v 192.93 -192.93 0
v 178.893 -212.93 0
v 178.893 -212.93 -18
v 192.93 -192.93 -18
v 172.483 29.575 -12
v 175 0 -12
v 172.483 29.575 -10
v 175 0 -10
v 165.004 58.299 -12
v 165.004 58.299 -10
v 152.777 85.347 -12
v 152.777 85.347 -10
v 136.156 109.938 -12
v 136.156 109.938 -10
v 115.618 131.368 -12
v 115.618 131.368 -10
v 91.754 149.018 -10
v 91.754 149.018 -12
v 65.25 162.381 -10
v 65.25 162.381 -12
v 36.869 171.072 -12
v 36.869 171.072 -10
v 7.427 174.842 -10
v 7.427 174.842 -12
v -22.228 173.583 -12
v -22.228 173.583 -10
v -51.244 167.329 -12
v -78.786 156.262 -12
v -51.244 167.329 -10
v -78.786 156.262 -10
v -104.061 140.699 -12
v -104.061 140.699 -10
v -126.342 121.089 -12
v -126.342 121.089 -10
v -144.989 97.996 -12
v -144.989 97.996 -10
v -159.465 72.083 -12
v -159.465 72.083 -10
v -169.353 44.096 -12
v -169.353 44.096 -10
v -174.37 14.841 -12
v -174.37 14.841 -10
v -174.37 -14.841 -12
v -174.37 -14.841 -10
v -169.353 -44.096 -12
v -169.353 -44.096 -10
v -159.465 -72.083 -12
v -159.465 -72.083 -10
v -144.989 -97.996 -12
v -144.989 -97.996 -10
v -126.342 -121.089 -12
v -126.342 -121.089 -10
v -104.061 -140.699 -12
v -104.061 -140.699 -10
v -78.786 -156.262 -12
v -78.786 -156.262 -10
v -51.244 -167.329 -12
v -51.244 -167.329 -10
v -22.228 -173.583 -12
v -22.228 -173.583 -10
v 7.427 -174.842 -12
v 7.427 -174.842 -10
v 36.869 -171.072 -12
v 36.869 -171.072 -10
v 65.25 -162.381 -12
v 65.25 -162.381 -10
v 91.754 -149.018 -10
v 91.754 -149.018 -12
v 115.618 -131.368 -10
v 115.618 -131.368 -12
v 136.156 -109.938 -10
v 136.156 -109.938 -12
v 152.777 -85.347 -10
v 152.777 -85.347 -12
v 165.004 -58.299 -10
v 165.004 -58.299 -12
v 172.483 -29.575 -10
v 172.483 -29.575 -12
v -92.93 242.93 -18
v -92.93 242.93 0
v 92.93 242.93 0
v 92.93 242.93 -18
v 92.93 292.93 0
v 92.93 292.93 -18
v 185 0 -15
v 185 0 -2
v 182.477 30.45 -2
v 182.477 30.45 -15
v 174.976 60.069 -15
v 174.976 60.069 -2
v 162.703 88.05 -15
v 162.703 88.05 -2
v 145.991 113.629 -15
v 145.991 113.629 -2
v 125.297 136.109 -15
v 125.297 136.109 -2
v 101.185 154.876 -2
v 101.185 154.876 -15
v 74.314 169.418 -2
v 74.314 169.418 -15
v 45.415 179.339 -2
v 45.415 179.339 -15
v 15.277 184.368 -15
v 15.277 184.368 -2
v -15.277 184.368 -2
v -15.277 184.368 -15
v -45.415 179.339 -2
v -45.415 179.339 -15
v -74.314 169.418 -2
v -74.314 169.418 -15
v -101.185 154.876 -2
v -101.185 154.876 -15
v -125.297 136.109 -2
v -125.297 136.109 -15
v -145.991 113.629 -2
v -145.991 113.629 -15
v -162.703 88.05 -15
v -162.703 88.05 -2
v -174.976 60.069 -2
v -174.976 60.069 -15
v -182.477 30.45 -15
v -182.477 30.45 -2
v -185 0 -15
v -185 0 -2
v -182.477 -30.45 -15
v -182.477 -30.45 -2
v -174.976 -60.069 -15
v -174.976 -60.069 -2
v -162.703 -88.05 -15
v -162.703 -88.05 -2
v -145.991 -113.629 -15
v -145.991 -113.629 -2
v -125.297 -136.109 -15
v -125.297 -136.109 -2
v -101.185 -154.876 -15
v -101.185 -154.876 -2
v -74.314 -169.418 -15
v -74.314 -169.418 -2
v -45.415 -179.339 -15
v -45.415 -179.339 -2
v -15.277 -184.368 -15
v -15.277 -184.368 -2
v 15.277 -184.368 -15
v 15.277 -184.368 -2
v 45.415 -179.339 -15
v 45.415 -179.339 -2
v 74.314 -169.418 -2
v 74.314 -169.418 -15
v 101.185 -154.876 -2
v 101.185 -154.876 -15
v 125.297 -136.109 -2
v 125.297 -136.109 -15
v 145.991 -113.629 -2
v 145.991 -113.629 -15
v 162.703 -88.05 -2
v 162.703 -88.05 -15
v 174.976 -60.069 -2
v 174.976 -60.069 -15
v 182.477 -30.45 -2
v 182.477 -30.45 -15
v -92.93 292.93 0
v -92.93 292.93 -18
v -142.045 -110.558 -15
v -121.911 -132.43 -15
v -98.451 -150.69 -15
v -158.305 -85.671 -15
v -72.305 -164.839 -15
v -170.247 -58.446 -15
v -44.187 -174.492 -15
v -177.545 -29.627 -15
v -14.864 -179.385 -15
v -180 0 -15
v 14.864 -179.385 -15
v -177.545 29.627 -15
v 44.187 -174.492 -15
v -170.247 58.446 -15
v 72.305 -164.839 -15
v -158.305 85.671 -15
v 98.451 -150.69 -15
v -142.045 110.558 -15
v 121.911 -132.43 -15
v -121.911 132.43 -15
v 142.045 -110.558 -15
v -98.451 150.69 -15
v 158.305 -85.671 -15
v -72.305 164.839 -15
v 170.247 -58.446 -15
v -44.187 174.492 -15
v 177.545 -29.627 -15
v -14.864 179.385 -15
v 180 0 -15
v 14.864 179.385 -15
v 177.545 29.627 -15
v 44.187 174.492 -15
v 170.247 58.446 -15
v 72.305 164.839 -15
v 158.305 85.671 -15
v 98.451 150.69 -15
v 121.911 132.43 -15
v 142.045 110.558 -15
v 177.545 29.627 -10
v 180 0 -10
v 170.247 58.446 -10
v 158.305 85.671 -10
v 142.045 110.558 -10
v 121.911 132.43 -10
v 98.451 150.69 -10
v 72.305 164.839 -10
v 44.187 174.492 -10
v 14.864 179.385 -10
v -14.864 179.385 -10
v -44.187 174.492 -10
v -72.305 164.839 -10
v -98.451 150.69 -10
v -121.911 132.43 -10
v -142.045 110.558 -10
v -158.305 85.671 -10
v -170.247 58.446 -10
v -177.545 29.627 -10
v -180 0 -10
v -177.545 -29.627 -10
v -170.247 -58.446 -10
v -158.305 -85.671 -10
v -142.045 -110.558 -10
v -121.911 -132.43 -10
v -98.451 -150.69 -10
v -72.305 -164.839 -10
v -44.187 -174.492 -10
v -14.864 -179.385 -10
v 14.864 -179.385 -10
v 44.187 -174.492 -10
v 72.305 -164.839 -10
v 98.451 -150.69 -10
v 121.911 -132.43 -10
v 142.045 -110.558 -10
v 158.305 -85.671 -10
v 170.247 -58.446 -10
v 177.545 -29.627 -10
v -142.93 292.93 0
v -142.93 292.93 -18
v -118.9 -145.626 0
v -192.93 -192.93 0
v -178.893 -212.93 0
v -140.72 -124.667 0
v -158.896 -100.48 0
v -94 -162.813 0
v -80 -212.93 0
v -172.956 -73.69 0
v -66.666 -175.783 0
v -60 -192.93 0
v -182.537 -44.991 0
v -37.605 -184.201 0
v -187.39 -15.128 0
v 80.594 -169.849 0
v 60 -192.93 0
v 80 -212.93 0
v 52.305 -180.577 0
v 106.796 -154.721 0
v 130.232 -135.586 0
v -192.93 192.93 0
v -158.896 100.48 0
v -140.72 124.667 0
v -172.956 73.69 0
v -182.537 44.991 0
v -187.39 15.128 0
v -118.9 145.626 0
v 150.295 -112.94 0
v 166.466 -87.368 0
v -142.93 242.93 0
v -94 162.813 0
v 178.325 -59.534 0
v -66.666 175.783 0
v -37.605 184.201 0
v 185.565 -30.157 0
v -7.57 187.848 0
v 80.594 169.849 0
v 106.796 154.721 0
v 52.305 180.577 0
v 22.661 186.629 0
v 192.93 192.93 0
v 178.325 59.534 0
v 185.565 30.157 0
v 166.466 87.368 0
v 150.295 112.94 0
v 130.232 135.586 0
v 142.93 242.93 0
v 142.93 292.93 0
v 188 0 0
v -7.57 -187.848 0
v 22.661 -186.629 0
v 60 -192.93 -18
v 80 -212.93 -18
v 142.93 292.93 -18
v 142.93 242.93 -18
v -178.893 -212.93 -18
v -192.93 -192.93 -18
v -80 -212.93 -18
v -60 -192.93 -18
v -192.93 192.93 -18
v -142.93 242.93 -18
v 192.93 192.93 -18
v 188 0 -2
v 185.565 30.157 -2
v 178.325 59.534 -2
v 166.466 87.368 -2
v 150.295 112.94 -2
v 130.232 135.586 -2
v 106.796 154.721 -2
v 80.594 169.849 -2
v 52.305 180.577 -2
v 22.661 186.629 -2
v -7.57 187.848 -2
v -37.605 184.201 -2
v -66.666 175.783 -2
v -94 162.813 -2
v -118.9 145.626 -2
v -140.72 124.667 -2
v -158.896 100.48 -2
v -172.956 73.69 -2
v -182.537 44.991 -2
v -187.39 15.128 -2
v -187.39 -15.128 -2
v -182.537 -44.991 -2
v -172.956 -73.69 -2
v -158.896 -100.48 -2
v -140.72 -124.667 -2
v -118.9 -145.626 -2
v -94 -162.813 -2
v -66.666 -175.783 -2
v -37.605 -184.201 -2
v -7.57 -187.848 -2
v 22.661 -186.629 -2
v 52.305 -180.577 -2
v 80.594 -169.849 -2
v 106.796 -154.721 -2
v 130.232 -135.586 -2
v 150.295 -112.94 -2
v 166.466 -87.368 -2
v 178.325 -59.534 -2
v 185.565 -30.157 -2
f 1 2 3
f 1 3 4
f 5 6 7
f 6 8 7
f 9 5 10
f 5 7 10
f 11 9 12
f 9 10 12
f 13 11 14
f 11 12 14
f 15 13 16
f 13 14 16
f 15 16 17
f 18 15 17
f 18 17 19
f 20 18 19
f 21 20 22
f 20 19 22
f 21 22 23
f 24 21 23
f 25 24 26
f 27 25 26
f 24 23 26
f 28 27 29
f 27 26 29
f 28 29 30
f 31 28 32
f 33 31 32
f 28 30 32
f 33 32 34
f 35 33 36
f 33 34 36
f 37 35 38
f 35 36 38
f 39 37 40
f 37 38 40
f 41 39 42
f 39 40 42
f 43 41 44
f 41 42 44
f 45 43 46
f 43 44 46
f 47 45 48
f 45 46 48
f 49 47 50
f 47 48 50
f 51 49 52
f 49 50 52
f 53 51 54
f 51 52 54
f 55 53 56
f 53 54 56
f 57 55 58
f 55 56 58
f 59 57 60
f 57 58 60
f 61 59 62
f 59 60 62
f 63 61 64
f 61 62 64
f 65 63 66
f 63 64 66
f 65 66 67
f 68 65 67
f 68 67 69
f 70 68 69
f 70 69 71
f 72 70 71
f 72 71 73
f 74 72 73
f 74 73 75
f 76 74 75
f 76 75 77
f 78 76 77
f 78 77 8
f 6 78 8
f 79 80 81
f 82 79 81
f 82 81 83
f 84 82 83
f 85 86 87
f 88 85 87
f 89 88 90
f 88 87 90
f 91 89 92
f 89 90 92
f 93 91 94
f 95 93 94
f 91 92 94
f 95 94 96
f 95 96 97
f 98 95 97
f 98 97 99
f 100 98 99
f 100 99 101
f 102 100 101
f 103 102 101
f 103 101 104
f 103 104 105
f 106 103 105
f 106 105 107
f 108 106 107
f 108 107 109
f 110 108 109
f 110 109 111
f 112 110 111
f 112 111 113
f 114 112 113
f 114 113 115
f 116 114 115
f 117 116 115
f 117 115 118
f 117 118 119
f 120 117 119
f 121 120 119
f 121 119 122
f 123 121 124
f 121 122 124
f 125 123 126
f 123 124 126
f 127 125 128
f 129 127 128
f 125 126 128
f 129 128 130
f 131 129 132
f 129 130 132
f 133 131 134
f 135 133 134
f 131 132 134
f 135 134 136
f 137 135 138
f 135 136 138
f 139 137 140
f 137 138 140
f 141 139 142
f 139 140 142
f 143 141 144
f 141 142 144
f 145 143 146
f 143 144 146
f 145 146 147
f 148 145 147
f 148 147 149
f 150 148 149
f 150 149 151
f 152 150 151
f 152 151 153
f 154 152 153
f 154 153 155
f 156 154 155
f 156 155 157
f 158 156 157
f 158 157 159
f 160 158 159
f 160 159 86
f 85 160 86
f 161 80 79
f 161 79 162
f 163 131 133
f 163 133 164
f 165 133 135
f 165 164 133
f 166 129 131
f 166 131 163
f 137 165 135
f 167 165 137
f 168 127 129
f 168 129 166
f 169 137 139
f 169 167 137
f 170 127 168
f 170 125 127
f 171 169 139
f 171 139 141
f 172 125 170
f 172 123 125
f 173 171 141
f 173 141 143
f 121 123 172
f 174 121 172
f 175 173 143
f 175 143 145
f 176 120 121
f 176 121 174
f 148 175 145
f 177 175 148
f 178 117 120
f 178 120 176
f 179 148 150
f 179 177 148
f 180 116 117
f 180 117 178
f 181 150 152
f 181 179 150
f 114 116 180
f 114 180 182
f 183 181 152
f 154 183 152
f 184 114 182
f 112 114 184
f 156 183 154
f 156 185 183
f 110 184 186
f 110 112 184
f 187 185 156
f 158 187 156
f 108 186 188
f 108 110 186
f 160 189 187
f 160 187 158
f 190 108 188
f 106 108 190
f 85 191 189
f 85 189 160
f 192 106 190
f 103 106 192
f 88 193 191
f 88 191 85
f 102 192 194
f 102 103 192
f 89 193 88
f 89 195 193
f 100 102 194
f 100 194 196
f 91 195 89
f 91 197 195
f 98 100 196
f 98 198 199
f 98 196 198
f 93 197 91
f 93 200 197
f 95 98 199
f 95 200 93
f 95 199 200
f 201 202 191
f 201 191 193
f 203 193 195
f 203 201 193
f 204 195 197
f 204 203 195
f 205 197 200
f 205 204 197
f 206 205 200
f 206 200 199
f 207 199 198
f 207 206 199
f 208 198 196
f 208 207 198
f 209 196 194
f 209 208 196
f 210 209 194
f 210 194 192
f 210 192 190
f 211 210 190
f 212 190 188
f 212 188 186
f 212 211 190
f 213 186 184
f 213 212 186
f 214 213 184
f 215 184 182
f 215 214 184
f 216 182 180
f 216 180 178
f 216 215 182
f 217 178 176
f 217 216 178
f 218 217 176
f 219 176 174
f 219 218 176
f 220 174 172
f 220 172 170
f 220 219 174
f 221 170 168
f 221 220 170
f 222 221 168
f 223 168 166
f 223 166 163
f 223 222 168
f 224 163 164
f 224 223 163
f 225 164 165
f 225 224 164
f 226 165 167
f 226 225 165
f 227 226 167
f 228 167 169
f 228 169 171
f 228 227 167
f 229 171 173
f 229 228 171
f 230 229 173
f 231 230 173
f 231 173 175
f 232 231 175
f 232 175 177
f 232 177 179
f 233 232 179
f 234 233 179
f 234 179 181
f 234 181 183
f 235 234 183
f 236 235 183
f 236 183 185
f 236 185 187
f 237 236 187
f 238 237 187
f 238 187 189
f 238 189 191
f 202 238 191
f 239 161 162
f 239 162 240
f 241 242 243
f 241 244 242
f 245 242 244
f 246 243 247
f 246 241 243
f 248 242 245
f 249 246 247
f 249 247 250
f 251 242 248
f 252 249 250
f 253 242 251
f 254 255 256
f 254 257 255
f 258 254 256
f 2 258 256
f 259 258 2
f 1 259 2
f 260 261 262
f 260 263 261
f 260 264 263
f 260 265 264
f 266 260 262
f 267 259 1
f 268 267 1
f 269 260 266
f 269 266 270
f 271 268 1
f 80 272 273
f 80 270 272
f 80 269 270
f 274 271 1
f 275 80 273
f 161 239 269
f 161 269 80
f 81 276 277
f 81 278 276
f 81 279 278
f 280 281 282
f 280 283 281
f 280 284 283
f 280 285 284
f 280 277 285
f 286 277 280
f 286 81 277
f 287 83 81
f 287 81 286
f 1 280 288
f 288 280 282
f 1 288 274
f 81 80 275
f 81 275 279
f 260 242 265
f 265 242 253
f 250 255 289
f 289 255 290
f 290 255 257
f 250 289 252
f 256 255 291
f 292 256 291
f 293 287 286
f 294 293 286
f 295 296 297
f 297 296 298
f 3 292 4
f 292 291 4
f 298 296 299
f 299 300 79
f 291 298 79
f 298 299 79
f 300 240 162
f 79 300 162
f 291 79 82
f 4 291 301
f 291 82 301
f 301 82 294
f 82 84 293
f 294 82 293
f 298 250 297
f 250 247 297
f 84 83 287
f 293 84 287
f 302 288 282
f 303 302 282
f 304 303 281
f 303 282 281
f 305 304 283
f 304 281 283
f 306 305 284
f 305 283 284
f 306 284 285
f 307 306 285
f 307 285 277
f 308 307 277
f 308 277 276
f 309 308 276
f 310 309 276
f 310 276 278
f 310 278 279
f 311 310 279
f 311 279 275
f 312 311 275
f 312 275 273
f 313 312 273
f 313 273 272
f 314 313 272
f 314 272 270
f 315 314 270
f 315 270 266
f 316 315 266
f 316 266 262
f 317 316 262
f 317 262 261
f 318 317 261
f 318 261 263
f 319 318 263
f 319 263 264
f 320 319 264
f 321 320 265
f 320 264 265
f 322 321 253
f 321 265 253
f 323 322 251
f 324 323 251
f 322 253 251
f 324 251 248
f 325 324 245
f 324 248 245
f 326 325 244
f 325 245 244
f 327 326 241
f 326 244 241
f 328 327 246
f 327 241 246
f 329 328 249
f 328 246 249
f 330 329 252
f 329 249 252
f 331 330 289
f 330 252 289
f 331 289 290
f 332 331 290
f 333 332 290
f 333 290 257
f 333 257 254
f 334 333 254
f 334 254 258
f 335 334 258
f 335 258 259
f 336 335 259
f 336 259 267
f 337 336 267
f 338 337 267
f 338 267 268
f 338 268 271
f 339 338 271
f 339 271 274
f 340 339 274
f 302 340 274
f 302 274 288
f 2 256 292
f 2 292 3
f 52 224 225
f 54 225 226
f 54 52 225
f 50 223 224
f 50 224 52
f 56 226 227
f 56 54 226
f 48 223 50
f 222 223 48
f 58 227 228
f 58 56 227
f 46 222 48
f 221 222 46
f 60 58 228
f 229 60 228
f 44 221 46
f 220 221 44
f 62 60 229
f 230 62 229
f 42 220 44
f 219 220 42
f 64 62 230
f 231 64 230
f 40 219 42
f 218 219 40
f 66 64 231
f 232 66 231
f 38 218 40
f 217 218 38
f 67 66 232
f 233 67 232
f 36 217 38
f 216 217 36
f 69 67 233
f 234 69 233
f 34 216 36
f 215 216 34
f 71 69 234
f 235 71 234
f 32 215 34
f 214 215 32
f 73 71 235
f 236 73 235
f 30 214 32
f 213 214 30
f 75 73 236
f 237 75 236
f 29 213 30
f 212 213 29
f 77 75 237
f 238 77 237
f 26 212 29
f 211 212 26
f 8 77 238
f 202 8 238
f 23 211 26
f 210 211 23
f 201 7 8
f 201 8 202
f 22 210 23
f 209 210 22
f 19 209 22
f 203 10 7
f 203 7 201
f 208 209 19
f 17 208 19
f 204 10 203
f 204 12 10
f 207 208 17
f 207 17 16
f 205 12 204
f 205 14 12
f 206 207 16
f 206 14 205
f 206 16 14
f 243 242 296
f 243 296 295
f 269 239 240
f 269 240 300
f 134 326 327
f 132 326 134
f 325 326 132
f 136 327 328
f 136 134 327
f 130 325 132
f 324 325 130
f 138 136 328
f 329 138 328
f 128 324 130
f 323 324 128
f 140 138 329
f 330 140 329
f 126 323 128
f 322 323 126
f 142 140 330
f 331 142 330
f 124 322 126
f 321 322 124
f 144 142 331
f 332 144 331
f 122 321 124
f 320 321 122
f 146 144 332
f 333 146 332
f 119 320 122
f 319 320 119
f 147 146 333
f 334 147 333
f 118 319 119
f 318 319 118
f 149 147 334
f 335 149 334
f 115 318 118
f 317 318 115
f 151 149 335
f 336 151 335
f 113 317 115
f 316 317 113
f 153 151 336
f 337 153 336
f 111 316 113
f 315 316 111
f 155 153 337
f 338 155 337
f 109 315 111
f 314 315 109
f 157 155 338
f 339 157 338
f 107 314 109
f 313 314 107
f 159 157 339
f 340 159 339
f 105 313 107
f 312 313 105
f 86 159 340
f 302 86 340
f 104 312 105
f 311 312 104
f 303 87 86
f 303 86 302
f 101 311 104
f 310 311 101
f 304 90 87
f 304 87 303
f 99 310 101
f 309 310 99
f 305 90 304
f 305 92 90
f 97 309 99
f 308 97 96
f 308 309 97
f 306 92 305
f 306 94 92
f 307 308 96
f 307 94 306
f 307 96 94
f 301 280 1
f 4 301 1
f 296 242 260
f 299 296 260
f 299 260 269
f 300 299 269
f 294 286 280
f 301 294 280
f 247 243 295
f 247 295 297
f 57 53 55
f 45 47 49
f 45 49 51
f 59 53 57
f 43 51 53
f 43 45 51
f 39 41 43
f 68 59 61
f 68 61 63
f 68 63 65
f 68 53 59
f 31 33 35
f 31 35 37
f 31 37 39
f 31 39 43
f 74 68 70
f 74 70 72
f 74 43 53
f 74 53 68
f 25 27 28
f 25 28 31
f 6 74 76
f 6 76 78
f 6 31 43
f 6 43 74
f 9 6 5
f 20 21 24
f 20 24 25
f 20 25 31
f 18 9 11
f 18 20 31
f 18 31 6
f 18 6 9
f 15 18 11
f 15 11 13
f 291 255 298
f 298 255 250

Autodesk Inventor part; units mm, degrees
ref_plane "YZ Plane" through (0, 0, 0) normal (1, 0, 0) x (0, 1, 0)
ref_plane "XZ Plane" through (0, 0, 0) normal (0, 1, 0) x (-1, 0, 0)
ref_plane "XY Plane" through (0, 0, 0) normal (0, 0, 1) x (1, 0, 0)
sketch "Sketch1" plane through (0, 0, 0) normal (0, 0, 1) x (1, 0, 0)
  circle A0 centre (0, 0) radius 165
  circle A1 centre (0, 0) radius 175
  line L0 (-192.9296, 192.9296) -> (192.9296, 192.9296)
  line L1 (192.9296, 192.9296) -> (192.9296, -192.9296)
  line L2 (192.9296, -192.9296) -> (-192.9296, -192.9296)
  line L3 (-192.9296, -192.9296) -> (-192.9296, 192.9296)
  line L4 (-192.9296, -192.9296) -> (-178.8933, -212.9296)
  line L5 (-178.8933, -212.9296) -> (178.8933, -212.9296)
  line L6 (178.8933, -212.9296) -> (192.9296, -192.9296)
  line L7 (-192.9296, 192.9296) -> (-142.9296, 242.9296)
  line L8 (-142.9296, 242.9296) -> (142.9296, 242.9296)
  line L9 (142.9296, 242.9296) -> (192.9296, 192.9296)
  line L10 (-142.9296, 242.9296) -> (-92.9296, 242.9296)
  line L11 (-92.9296, 242.9296) -> (-92.9296, 292.9296)
  line L12 (-92.9296, 292.9296) -> (-142.9296, 292.9296)
  line L13 (-142.9296, 292.9296) -> (-142.9296, 242.9296)
  line L14 (142.9296, 242.9296) -> (92.9296, 242.9296)
  line L15 (92.9296, 242.9296) -> (92.9296, 292.9296)
  line L16 (92.9296, 292.9296) -> (142.9296, 292.9296)
  line L17 (142.9296, 292.9296) -> (142.9296, 242.9296)
  line L18 (-60, -212.9296) -> (60, -212.9296)
  line L19 (60, -212.9296) -> (60, -192.9296)
  line L20 (60, -192.9296) -> (-60, -192.9296)
  line L21 (-60, -192.9296) -> (-60, -212.9296)
  circle A2 centre (0, 0) radius 185
  circle A3 centre (0, 0) radius 180
  circle A4 centre (0, 0) radius 188
  point P0 (0, 192.9296)
  point P1 (-192.9296, 0)
  point P2 (0, 242.9296)
  point P3 (0, -212.9296)
  dimension "d0" = 330
  dimension "d1" = 10
  dimension "d2" = 54.938
  dimension "d3" = 54.938
  dimension "d4" = 20
  dimension "d5" = 45
  dimension "d6" = 45
  dimension "d7" = 50
  dimension "d12" = 120
  dimension "d15" = 10
  dimension "d16" = 5
  dimension "d21" = 3
  dimension "d27" = 50
extrude "Extrusion1" add sketch "Sketch1" against normal blind 18 contours A0 | A1 | L7 L8 L9 L0 | L0 L1 L2 L3 | L2 L21 L5 L4 | L13 L12 L11 L8 | L6 L5 L19 L2 | L8 L15 L16 L17 | L2 L19 L5 L21 | A2 | A3 | A4
extrude "Extrusion2" cut sketch "Sketch1" against normal blind 12 contours A0 | A1
extrude "Extrusion3" cut sketch "Sketch1" against normal blind 18 contours L2 L19 L5 L21
extrude "Extrusion4" cut sketch "Sketch1" against normal blind 15 contours A2
extrude "Extrusion5" cut sketch "Sketch1" against normal blind 10 contours A3
extrude "Extrusion6" cut sketch "Sketch1" against normal blind 2 contours A4
chamfer "Chamfer1" distance 20 angle 45 2 edges at (-60, -212.9296, -9) (60, -212.9296, -9)
equation "\"d3\" = d2"
properties part number "Base"
